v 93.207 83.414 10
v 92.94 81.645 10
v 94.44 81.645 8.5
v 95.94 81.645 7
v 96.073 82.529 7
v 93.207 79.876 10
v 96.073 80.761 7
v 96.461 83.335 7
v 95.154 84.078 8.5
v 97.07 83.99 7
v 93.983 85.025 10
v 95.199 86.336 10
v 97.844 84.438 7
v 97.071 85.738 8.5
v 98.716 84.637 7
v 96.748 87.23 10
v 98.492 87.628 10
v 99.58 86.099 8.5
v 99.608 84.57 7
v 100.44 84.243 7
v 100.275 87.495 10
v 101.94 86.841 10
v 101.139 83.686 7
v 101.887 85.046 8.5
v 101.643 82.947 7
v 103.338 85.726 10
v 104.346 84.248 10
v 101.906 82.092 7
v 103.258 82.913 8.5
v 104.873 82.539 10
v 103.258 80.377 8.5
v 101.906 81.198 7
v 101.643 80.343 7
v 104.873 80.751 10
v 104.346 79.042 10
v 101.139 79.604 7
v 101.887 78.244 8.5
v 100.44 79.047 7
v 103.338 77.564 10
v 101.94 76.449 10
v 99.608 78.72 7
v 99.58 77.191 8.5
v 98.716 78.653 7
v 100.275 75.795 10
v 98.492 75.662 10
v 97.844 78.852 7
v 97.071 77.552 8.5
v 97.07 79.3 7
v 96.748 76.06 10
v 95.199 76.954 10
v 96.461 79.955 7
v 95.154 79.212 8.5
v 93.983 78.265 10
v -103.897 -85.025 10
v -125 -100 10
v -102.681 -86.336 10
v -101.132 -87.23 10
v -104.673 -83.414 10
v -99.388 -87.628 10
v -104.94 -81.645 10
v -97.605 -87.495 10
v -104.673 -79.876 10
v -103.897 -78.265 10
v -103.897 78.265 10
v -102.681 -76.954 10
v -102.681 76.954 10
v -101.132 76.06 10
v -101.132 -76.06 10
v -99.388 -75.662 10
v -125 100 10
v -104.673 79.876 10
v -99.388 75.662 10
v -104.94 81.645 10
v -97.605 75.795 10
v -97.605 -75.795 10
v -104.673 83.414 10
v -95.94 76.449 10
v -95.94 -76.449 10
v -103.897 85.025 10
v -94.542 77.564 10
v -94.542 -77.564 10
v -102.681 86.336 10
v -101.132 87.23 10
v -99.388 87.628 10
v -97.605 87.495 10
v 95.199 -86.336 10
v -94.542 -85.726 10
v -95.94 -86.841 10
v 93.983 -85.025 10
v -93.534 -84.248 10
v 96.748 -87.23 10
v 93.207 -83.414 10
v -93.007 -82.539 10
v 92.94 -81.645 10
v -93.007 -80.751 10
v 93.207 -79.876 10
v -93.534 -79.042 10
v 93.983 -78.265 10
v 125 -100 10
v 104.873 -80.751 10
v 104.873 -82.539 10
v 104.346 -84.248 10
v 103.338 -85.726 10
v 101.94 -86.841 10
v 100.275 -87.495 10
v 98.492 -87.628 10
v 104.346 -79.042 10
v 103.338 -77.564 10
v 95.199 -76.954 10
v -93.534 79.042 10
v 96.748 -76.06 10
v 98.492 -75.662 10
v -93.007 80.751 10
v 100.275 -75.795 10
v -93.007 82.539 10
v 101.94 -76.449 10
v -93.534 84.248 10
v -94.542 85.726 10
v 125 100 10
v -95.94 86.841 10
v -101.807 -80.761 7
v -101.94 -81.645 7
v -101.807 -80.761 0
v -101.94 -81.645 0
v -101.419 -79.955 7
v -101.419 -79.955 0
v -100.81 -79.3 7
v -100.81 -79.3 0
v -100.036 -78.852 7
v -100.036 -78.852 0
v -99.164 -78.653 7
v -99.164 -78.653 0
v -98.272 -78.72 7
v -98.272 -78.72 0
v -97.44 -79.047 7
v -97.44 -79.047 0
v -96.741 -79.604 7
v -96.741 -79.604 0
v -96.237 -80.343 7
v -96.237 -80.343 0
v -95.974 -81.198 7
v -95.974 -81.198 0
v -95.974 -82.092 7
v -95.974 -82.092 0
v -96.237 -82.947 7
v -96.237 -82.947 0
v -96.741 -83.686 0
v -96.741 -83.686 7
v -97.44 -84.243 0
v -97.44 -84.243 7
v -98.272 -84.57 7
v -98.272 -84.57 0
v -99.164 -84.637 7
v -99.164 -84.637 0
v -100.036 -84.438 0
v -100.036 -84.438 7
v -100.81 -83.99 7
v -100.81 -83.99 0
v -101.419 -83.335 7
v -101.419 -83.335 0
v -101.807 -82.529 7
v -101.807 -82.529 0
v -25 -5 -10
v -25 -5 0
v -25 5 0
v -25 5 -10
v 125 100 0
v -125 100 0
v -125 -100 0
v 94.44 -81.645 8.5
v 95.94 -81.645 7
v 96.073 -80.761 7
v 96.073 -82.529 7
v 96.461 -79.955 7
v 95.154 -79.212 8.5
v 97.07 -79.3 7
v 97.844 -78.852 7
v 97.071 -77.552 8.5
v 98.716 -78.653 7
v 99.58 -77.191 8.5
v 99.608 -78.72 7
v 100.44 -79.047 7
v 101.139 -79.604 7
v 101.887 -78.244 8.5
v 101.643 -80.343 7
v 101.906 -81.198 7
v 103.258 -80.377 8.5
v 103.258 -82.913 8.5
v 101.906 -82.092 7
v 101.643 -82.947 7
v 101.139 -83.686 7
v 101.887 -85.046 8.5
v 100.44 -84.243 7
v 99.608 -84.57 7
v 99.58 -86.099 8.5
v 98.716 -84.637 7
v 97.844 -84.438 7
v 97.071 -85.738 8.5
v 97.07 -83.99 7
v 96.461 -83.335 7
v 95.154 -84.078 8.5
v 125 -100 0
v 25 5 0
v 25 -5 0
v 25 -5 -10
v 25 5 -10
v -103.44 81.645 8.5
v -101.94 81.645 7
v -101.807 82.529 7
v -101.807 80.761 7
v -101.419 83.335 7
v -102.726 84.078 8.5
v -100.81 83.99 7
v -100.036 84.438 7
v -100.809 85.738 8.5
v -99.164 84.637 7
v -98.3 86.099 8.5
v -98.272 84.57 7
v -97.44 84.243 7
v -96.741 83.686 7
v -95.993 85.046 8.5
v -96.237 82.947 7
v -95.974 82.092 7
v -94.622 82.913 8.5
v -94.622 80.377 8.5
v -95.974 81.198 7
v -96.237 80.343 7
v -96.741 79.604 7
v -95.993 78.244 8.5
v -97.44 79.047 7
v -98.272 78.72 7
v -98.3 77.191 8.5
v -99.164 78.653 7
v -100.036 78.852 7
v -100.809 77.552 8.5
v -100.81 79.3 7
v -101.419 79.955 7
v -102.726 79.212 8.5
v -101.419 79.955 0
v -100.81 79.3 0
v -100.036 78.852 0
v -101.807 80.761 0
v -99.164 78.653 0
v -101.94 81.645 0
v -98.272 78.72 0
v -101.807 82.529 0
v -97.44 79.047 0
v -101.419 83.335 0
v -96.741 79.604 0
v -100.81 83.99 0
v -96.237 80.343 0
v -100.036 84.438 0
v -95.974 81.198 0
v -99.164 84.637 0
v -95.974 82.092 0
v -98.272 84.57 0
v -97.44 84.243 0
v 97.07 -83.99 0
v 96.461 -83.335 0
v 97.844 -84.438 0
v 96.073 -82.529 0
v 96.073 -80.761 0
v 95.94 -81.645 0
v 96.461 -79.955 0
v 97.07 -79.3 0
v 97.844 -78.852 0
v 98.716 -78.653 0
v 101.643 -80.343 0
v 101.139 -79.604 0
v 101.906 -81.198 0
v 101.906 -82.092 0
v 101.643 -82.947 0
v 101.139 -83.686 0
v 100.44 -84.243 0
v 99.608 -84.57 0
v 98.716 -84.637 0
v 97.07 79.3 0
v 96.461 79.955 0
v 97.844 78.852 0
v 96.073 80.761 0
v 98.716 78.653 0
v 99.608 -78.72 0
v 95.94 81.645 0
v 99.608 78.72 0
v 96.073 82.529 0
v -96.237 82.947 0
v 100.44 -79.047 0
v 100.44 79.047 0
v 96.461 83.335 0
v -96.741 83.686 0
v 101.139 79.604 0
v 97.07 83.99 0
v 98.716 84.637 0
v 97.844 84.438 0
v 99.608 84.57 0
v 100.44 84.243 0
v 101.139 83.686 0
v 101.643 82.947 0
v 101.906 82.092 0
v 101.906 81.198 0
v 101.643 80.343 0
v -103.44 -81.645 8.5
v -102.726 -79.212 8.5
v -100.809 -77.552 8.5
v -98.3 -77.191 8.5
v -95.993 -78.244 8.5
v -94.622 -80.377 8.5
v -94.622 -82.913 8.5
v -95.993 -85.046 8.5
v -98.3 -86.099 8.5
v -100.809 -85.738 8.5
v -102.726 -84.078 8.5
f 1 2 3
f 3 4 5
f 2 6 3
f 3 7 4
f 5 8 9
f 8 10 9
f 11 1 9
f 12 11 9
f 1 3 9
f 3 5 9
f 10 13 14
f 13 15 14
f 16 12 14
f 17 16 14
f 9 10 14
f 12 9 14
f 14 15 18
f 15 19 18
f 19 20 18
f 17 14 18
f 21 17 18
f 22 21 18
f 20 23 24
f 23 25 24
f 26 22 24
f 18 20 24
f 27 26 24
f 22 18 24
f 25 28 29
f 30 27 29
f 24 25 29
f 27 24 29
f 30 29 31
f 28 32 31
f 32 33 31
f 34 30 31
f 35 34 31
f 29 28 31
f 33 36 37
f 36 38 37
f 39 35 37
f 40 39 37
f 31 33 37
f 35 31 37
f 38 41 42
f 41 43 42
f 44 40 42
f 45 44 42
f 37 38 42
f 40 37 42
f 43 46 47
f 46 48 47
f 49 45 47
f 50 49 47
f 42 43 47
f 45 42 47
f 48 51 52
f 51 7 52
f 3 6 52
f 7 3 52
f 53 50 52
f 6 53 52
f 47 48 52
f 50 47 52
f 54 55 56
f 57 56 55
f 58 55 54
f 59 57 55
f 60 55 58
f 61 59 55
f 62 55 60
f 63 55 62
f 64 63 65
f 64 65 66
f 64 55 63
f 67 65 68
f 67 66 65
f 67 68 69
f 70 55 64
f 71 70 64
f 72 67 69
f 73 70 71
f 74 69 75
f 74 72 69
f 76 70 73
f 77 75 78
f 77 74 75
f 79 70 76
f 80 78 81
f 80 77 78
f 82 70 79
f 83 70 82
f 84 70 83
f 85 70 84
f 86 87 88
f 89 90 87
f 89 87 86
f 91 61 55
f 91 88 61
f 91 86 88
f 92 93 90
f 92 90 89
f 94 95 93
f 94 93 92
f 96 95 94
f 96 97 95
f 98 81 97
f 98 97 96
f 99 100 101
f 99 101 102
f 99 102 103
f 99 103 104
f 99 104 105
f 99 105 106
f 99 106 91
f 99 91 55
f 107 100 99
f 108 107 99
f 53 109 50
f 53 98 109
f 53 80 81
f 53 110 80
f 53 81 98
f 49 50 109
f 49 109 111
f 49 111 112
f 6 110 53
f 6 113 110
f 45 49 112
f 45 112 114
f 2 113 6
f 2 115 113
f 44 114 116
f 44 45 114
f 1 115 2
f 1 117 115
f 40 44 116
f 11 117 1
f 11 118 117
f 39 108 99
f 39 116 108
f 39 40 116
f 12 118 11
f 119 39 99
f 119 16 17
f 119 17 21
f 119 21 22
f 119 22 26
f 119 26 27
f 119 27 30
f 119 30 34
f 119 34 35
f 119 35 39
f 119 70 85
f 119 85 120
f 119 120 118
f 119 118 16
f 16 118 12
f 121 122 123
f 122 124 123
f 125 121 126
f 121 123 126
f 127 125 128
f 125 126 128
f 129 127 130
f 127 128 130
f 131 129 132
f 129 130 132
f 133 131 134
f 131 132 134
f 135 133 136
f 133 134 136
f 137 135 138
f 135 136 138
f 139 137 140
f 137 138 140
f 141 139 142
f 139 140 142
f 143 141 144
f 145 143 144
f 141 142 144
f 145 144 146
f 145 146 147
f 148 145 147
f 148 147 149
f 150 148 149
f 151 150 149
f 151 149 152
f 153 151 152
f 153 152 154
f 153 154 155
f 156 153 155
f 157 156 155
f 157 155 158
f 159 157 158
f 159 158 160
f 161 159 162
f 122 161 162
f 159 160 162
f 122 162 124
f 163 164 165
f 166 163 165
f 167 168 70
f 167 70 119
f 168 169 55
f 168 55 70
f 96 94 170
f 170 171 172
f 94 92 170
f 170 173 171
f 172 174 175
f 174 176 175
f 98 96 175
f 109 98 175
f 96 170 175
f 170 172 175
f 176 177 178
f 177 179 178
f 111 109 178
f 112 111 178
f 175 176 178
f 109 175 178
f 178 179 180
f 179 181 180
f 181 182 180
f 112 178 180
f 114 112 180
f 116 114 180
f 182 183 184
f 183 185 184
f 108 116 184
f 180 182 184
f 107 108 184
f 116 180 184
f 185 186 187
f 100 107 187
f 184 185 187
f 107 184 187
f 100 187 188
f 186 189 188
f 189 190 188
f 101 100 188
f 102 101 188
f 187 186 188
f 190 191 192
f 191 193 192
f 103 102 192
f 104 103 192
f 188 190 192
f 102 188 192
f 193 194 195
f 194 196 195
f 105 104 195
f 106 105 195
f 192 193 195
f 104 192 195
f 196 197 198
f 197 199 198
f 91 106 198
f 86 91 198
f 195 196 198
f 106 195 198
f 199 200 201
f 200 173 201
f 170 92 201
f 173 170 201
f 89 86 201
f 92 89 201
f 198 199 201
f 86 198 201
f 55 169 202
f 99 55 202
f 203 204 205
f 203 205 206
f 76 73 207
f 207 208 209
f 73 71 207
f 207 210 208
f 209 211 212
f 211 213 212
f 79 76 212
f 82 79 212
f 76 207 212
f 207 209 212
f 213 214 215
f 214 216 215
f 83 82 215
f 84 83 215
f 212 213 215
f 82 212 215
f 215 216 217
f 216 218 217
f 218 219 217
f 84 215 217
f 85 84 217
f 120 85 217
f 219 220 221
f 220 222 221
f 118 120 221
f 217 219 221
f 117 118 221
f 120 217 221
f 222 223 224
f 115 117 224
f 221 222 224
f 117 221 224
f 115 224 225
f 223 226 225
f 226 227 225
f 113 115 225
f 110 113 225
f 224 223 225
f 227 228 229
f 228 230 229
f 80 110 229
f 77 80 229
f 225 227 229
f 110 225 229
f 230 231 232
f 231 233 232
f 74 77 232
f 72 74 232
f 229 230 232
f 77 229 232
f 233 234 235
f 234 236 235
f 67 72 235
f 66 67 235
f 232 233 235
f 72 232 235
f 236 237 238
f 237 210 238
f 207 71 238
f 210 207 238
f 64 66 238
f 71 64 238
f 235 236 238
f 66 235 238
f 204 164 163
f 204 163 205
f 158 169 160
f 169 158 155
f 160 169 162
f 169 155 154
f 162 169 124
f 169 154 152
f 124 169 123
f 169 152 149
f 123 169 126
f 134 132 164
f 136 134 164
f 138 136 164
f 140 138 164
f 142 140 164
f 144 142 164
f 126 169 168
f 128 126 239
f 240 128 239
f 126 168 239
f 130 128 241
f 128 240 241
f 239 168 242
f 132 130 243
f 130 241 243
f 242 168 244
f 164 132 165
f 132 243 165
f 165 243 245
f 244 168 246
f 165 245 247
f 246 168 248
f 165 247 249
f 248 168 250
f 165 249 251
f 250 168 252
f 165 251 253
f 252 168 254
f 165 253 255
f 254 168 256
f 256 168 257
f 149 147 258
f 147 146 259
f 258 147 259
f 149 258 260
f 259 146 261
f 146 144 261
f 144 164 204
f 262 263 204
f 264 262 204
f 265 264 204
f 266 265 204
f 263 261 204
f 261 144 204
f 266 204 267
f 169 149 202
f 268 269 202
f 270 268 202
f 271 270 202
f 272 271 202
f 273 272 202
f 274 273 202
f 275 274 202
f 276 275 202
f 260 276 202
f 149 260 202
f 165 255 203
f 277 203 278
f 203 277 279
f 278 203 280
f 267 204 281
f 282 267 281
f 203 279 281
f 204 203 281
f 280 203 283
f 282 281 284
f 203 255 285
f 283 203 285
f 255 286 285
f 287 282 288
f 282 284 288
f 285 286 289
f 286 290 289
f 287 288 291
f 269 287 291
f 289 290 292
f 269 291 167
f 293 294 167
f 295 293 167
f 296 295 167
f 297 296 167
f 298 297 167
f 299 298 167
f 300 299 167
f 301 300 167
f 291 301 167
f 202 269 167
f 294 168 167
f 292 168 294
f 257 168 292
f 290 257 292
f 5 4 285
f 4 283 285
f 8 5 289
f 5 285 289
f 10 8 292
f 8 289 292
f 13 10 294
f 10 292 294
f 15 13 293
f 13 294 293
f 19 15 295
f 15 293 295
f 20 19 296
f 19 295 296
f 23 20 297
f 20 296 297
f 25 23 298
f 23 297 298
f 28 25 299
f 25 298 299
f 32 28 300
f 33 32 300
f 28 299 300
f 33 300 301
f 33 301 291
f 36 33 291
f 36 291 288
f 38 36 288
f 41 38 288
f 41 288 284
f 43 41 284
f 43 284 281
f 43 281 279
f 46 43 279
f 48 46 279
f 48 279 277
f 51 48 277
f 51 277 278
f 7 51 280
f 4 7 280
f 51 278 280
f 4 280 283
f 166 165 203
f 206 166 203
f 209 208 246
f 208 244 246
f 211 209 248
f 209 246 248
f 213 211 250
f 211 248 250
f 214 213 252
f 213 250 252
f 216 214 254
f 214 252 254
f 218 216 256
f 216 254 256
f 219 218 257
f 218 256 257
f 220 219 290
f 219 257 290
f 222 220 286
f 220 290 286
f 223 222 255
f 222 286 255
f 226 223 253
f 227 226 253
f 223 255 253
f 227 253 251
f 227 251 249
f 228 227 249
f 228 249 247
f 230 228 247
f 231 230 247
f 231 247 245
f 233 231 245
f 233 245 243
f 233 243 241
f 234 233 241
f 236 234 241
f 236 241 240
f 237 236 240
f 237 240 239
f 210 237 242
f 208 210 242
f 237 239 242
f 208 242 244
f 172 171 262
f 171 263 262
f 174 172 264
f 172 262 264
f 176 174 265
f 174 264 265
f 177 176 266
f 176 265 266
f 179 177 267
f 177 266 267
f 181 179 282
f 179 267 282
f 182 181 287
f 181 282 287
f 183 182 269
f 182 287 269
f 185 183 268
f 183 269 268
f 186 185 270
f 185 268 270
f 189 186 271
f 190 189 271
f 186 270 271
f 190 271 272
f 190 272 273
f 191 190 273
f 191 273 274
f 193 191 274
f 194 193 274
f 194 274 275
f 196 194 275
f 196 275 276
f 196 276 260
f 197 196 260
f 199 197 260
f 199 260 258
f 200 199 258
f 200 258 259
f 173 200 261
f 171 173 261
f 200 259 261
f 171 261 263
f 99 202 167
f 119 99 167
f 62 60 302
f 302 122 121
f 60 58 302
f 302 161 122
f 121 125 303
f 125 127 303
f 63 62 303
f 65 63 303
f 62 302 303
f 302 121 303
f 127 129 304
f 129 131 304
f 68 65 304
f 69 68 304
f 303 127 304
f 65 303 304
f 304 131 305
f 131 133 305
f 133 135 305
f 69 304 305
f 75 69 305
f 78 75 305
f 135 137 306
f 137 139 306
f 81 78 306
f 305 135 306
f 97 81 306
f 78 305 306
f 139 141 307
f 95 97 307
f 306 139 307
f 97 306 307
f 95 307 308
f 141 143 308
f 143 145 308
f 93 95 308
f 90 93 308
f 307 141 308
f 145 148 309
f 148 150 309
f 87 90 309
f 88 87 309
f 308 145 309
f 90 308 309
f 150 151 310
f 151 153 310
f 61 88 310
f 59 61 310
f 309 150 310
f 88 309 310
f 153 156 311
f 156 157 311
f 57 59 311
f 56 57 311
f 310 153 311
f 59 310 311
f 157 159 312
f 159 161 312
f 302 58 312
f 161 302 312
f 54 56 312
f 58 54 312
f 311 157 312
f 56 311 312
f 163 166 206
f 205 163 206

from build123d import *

# Parameters (mm, degrees)
F0_W           = 250
F0_H           = 200
F1_DEPTH       = 10
F3_D           = 6
F3_CSINK_D     = 12
F3_CSINK_ANGLE = 90
F4_W           = 50
F4_H           = 10
F5_DEPTH       = 10


with BuildPart() as f1:
    # F0 (on Top) → F1 (new body)
    with BuildSketch(Plane.XY):
        Rectangle(F0_W, F0_H)
    extrude(amount=F1_DEPTH)

    # F3 (through all)
    with Locations(Plane.XY.offset(10)):
        with Locations((-98.94, 81.645), (98.94, 81.645), (98.94, -81.645), (-98.94, -81.645)):
            CounterSinkHole(F3_D / 2, F3_CSINK_D / 2, counter_sink_angle=F3_CSINK_ANGLE)

    # F4 (on Top) → F5 (join)
    with BuildSketch(Plane.XY):
        Rectangle(F4_W, F4_H)
    extrude(amount=-F5_DEPTH)


solid = f1.part
